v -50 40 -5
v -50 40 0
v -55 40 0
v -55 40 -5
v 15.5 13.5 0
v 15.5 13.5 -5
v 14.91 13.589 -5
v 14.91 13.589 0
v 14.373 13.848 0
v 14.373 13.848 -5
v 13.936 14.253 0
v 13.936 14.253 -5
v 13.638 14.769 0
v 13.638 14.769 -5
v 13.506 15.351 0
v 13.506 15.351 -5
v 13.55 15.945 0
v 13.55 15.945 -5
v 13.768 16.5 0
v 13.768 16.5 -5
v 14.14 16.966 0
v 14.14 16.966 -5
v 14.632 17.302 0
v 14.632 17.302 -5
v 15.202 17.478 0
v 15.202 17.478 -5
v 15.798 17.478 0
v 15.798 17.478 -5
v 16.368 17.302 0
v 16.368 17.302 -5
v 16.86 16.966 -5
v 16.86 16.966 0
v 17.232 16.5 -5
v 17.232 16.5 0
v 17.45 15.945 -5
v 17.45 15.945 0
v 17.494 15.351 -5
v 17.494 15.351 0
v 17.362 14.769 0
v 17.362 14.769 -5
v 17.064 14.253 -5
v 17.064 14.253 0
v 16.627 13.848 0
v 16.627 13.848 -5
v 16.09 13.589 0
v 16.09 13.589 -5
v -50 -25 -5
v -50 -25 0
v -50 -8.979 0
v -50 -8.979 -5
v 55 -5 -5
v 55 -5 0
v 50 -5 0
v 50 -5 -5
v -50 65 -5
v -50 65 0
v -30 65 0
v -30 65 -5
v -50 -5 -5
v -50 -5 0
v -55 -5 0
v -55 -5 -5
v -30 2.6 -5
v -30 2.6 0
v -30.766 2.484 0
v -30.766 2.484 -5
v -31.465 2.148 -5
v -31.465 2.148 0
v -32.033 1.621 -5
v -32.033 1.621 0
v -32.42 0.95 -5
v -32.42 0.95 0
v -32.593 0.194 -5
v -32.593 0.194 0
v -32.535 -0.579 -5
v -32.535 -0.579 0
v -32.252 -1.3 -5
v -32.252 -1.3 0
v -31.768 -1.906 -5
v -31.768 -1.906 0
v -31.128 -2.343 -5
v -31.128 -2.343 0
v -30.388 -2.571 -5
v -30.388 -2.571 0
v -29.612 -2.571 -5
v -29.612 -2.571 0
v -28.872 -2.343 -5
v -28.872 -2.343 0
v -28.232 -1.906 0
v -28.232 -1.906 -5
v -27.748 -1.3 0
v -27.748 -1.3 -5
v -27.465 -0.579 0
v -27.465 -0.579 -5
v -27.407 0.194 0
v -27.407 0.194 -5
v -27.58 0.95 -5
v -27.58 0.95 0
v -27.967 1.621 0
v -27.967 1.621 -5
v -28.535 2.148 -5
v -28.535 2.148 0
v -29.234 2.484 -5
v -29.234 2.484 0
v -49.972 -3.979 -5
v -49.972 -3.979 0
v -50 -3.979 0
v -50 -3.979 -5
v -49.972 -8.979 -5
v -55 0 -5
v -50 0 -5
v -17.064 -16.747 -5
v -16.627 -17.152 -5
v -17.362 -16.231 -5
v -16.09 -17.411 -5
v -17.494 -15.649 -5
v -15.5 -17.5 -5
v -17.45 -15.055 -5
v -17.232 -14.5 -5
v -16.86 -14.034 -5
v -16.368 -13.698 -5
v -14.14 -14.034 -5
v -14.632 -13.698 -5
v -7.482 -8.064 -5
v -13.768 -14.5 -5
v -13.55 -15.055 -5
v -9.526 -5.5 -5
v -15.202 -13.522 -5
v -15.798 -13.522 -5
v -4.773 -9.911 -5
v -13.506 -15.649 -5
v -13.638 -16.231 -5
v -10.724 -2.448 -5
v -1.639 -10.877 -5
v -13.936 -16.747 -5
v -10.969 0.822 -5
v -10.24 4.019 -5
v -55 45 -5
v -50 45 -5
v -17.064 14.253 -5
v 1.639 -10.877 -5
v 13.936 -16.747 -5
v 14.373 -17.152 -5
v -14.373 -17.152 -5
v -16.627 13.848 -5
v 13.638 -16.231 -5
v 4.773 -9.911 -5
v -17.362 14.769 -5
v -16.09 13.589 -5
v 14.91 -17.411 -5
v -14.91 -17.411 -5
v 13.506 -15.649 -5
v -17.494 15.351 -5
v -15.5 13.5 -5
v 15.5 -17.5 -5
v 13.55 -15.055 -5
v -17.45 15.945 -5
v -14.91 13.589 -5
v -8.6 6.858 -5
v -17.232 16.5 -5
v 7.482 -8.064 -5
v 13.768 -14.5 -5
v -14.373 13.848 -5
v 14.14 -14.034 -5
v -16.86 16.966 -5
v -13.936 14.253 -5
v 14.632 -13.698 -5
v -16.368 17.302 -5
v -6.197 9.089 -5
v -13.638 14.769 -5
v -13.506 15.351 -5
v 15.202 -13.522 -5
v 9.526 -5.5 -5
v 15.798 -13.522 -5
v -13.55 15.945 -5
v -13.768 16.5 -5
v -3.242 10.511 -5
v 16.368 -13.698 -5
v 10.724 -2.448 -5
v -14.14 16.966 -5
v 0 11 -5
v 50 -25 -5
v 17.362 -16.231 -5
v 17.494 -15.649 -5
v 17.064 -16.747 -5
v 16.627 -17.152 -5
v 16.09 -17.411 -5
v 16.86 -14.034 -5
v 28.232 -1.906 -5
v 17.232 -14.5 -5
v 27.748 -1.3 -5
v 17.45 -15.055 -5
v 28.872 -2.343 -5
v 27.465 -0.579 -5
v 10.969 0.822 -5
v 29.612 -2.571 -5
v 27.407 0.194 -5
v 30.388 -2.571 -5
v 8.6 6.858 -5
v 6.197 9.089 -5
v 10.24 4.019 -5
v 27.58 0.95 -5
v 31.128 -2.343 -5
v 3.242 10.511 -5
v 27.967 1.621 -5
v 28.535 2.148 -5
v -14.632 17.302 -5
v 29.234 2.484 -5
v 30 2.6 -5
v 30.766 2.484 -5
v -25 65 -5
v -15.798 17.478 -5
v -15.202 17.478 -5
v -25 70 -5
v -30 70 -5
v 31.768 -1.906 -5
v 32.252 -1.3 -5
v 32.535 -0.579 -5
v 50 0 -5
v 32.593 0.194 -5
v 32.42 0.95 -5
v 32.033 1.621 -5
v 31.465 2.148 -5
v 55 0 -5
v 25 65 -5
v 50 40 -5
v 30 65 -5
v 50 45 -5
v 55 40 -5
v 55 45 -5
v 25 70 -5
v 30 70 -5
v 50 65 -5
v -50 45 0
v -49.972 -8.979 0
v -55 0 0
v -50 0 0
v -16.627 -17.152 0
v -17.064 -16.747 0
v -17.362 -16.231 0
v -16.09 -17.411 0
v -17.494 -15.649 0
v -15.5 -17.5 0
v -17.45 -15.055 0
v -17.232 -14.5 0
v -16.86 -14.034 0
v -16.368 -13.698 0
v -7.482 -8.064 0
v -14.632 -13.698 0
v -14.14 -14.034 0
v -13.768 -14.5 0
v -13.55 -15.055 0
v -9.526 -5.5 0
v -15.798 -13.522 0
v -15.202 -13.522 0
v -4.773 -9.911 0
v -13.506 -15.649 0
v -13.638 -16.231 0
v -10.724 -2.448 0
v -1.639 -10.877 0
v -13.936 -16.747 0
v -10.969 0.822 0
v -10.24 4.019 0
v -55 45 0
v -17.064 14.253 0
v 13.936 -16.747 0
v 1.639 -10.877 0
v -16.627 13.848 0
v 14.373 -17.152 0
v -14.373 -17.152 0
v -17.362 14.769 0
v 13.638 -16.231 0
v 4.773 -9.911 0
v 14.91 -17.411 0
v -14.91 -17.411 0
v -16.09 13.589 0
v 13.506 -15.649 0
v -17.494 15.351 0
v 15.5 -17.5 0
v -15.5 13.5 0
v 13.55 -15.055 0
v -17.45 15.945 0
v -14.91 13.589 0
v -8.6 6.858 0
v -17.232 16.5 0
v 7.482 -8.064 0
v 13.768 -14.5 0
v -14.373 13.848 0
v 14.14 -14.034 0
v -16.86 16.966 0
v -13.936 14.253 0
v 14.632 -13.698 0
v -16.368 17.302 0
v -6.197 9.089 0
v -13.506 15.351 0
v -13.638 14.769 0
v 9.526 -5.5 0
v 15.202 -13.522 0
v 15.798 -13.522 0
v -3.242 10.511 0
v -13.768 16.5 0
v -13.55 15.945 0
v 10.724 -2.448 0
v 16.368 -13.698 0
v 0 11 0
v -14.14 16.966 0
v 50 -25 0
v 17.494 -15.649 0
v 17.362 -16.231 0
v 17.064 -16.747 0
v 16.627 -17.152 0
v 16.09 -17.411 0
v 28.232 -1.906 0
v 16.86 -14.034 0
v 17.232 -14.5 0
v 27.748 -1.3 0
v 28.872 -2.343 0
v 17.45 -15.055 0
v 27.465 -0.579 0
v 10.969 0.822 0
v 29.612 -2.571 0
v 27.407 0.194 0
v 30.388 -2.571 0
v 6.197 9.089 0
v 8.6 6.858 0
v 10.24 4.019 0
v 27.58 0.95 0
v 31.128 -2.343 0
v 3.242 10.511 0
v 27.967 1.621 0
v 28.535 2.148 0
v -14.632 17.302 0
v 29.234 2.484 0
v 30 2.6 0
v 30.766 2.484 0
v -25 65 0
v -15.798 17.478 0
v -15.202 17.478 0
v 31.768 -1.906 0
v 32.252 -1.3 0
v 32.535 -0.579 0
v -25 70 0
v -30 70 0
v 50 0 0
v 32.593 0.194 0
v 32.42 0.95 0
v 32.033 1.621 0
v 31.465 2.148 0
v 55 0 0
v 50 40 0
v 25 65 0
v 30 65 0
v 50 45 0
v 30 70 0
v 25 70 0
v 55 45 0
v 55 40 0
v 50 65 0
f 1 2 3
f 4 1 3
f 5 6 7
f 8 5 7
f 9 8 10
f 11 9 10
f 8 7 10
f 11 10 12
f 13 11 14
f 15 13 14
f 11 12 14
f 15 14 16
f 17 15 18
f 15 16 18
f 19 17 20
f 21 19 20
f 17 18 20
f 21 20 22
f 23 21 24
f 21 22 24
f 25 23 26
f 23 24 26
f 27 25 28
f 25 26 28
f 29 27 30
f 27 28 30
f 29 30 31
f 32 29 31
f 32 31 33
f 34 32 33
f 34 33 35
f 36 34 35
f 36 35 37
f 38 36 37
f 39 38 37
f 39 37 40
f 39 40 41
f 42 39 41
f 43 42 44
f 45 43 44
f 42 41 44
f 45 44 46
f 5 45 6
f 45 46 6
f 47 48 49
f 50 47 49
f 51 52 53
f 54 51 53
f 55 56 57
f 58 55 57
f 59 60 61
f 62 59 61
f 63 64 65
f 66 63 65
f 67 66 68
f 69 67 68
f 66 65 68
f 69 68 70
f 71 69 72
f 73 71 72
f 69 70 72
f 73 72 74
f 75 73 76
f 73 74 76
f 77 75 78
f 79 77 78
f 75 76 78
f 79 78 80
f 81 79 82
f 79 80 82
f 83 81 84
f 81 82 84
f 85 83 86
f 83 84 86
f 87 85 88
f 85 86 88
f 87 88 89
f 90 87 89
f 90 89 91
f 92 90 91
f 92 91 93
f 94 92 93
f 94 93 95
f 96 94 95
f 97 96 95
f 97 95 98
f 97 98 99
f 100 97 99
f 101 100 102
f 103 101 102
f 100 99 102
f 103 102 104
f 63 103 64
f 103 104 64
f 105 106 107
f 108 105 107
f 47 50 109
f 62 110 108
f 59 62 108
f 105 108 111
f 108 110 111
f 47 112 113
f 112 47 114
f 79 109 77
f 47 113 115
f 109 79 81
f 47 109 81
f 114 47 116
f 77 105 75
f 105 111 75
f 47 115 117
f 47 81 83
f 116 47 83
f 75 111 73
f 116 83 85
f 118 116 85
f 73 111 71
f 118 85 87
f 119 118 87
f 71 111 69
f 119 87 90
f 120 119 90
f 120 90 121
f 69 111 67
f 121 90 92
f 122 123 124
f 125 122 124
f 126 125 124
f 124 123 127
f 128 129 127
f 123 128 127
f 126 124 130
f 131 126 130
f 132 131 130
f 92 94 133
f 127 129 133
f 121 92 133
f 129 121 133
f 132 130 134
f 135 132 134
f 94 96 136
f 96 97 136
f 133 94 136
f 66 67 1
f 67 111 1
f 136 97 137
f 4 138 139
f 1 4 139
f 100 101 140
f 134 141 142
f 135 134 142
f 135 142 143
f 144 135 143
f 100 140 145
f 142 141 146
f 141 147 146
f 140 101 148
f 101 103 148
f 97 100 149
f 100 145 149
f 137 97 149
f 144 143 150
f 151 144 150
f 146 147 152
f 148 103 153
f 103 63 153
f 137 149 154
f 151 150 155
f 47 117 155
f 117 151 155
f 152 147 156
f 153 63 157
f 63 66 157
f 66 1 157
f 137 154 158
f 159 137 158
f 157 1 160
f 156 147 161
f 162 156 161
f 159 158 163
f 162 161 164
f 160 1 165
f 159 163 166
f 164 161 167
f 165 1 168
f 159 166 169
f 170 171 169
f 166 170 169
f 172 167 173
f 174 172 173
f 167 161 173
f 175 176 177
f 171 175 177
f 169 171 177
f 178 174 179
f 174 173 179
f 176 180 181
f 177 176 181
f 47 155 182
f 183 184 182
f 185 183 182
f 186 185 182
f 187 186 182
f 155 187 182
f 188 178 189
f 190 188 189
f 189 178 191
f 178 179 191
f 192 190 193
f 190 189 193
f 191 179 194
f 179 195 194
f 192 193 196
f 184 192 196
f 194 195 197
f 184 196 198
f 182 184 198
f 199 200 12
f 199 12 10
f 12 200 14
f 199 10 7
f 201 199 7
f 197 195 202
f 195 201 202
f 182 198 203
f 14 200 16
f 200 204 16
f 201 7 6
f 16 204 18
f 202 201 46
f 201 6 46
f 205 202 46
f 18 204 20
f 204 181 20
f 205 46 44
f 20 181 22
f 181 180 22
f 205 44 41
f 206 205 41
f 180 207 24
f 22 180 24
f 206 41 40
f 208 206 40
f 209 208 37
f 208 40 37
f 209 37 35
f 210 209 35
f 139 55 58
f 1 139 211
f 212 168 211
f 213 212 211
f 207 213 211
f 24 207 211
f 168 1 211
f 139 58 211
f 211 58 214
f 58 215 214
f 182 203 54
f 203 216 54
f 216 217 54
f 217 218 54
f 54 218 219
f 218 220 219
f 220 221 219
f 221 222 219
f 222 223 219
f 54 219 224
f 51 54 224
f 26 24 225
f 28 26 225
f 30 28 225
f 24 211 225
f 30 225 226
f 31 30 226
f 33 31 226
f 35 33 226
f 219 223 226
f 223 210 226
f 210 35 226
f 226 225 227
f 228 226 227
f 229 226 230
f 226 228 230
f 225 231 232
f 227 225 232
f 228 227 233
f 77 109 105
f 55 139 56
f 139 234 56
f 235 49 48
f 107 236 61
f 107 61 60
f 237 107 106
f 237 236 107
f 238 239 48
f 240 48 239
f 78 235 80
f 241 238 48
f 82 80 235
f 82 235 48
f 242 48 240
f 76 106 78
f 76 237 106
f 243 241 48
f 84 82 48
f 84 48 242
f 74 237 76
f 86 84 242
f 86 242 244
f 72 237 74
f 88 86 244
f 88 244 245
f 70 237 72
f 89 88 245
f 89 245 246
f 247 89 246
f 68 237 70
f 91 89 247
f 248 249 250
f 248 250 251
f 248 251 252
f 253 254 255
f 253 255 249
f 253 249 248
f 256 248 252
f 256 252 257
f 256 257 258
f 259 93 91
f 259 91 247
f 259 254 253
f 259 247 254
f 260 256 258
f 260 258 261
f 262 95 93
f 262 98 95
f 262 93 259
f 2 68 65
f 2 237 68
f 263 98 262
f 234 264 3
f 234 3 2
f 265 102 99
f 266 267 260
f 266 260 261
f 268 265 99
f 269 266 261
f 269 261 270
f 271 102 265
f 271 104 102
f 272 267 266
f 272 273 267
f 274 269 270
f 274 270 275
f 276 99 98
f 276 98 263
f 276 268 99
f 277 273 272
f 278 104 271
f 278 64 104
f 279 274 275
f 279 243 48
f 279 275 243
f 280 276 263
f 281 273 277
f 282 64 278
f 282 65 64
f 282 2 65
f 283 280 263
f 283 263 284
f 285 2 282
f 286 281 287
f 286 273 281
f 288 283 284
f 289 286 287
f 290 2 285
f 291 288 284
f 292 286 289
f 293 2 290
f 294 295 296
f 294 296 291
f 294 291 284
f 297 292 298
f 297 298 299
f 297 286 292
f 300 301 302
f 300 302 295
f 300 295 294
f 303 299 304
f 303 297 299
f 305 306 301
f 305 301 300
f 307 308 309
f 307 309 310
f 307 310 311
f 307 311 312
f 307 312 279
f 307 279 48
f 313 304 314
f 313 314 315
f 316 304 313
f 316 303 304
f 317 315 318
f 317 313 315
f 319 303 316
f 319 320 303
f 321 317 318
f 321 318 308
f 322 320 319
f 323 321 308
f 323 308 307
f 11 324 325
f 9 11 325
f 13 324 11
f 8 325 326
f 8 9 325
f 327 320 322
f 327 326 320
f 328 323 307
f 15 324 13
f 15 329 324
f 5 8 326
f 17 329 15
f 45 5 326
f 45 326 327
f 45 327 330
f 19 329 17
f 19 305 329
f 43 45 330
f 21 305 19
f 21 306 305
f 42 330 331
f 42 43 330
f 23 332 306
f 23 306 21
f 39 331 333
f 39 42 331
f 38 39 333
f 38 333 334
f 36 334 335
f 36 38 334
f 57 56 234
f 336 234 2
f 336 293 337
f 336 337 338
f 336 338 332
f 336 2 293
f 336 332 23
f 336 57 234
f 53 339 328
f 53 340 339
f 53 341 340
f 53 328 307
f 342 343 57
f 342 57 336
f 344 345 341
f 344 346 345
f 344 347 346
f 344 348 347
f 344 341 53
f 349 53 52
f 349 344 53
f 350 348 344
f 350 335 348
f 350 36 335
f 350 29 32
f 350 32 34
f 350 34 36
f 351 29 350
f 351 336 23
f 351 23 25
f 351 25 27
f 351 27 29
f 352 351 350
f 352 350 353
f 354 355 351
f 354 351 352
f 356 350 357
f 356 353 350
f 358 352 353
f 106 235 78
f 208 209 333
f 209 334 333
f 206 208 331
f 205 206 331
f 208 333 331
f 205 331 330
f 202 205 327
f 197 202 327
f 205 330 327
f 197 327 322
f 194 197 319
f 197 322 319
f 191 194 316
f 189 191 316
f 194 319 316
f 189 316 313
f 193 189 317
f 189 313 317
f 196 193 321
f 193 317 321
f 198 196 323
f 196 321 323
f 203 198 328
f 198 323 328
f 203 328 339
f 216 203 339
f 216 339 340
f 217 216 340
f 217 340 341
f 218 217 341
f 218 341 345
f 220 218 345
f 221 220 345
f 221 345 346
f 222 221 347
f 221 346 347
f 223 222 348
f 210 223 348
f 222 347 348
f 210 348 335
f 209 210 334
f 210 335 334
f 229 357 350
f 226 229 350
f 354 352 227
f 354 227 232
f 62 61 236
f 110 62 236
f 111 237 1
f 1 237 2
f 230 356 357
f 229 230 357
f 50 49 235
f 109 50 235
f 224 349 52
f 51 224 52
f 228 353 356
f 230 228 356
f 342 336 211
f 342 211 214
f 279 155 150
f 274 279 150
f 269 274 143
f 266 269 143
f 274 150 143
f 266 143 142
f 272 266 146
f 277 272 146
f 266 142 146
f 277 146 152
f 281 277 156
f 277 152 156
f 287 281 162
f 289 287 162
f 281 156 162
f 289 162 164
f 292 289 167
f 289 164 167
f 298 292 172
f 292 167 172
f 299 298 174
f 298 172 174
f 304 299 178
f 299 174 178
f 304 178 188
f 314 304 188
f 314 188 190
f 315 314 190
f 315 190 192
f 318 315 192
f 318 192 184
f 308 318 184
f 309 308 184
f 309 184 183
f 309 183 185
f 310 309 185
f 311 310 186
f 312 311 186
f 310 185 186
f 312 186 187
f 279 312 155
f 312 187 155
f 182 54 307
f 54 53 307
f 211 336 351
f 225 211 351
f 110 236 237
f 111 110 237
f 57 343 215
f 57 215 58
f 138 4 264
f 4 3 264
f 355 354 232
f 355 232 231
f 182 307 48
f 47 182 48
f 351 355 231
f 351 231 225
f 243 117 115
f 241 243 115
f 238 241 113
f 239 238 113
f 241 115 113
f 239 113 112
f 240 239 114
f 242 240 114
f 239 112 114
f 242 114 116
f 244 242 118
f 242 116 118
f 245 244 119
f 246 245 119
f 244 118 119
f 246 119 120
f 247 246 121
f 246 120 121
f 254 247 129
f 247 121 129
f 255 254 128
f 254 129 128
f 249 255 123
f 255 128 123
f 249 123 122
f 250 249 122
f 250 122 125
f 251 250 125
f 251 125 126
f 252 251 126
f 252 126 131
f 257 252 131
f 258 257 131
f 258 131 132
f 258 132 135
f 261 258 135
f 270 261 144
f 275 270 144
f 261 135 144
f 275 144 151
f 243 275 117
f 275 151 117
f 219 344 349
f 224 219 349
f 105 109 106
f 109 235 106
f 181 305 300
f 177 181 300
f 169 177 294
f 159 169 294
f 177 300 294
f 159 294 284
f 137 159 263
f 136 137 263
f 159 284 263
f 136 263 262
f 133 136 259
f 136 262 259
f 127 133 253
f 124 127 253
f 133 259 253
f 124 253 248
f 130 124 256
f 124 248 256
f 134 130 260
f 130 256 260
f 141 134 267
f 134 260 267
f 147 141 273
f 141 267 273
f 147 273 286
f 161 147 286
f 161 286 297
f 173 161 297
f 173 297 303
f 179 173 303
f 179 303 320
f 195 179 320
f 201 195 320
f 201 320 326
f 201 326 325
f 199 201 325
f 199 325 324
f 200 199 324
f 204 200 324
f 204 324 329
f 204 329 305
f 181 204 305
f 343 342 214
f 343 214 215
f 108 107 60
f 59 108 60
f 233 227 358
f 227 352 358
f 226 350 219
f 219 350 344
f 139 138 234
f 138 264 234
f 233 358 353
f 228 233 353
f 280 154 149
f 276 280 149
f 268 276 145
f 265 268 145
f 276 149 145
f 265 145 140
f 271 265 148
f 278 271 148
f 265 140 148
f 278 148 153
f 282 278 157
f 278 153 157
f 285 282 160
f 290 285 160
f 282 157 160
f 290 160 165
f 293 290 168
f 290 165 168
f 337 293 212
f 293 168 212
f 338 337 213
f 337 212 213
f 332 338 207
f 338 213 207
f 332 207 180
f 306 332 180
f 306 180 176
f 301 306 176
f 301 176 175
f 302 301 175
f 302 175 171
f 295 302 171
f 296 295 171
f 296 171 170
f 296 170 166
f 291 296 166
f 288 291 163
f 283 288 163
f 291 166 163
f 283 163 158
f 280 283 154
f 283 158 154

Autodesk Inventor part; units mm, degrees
ref_plane "YZ Plane" through (0, 0, 0) normal (1, 0, 0) x (0, 1, 0)
ref_plane "XZ Plane" through (0, 0, 0) normal (0, 1, 0) x (-1, 0, 0)
ref_plane "XY Plane" through (0, 0, 0) normal (0, 0, 1) x (1, 0, 0)
sketch "Block1" plane through (0, 0, 0) normal (0, 0, 1) x (1, 0, 0)
  line L0 (-30.1, 34.1) -> (-9.9, 34.1)
  line L1 (-9.9, 34.1) -> (-9.9, 25.1)
  line L2 (-9.9, 25.1) -> (9.9, 25.1)
  line L3 (9.9, 25.1) -> (9.9, 34.1)
  line L4 (9.9, 34.1) -> (30.1, 34.1)
  line L5 (30.1, 34.1) -> (30.1, 25.1)
  line L6 (30.1, 25.1) -> (50.1, 25.1)
  line L7 (50.1, 25.1) -> (50.1, 16.5667)
  line L8 (50.1, 16.5667) -> (41.1, 16.5667)
  line L9 (41.1, 16.5667) -> (41.1, 6.7667)
  line L10 (41.1, 6.7667) -> (50.1, 6.7667)
  line L11 (50.1, 6.7667) -> (50.1, -6.7667)
  line L12 (50.1, -6.7667) -> (41.1, -6.7667)
  line L13 (41.1, -6.7667) -> (41.1, -16.5667)
  line L14 (41.1, -16.5667) -> (50.1, -16.5667)
  line L15 (50.1, -16.5667) -> (50.1, -25.1)
  line L16 (50.1, -25.1) -> (30.1, -25.1)
  line L17 (30.1, -25.1) -> (30.1, -34.1)
  line L18 (30.1, -34.1) -> (9.9, -34.1)
  line L19 (9.9, -34.1) -> (9.9, -25.1)
  line L20 (9.9, -25.1) -> (-9.9, -25.1)
  line L21 (-9.9, -25.1) -> (-9.9, -34.1)
  line L22 (-9.9, -34.1) -> (-30.1, -34.1)
  line L23 (-30.1, -34.1) -> (-30.1, -25.1)
  line L24 (-30.1, -25.1) -> (-50.1, -25.1)
  line L25 (-50.1, -25.1) -> (-50.1, -16.5667)
  line L26 (-50.1, -16.5667) -> (-41.1, -16.5667)
  line L27 (-41.1, -16.5667) -> (-41.1, -6.7667)
  line L28 (-41.1, -6.7667) -> (-50.1, -6.7667)
  line L29 (-50.1, -6.7667) -> (-50.1, 6.7667)
  line L30 (-50.1, 6.7667) -> (-41.1, 6.7667)
  line L31 (-41.1, 6.7667) -> (-41.1, 16.5667)
  line L32 (-41.1, 16.5667) -> (-50.1, 16.5667)
  line L33 (-50.1, 16.5667) -> (-50.1, 25.1)
  line L34 (-50.1, 25.1) -> (-30.1, 25.1)
  line L35 (-30.1, 25.1) -> (-30.1, 34.1)
  circle A0 centre (-30, 0) radius 4.6
  circle A1 centre (-15.5, 15.5) radius 2.1
  circle A2 centre (-15.5, -15.5) radius 2.1
  circle A3 centre (0, 0) radius 11.1
  circle A4 centre (15.5, 15.5) radius 2.1
  circle A5 centre (30, 0) radius 4.6
  circle A6 centre (15.5, -15.5) radius 2.1
  point P0 (0, 0)
sketch "Block2" plane through (0, 0, 0) normal (0, 0, 1) x (1, 0, 0)
  line L0 (9.8, 34.2) -> (30.2, 34.2)
  line L1 (30.2, 34.2) -> (30.2, 25.2)
  line L2 (30.2, 25.2) -> (50.2, 25.2)
  line L3 (50.2, 25.2) -> (50.2, 16.4667)
  line L4 (50.2, 16.4667) -> (41.2, 16.4667)
  line L5 (41.2, 16.4667) -> (41.2, 6.8667)
  line L6 (41.2, 6.8667) -> (50.2, 6.8667)
  line L7 (50.2, 6.8667) -> (50.2, -6.8667)
  line L8 (50.2, -6.8667) -> (41.2, -6.8667)
  line L9 (41.2, -6.8667) -> (41.2, -16.4667)
  line L10 (41.2, -16.4667) -> (50.2, -16.4667)
  line L11 (50.2, -16.4667) -> (50.2, -25.2)
  line L12 (50.2, -25.2) -> (30.2, -25.2)
  line L13 (30.2, -25.2) -> (30.2, -34.2)
  line L14 (30.2, -34.2) -> (9.8, -34.2)
  line L15 (9.8, -34.2) -> (9.8, -25.2)
  line L16 (9.8, -25.2) -> (-9.8, -25.2)
  line L17 (-9.8, -25.2) -> (-9.8, -34.2)
  line L18 (-9.8, -34.2) -> (-30.2, -34.2)
  line L19 (-30.2, -34.2) -> (-30.2, -25.2)
  line L20 (-30.2, -25.2) -> (-50.2, -25.2)
  line L21 (-50.2, -25.2) -> (-50.2, -16.4667)
  line L22 (-50.2, -16.4667) -> (-41.2, -16.4667)
  line L23 (-41.2, -16.4667) -> (-41.2, -6.8667)
  line L24 (-41.2, -6.8667) -> (-50.2, -6.8667)
  line L25 (-50.2, -6.8667) -> (-50.2, 6.8667)
  line L26 (-50.2, 6.8667) -> (-41.2, 6.8667)
  line L27 (-41.2, 6.8667) -> (-41.2, 16.4667)
  line L28 (-41.2, 16.4667) -> (-50.2, 16.4667)
  line L29 (-50.2, 16.4667) -> (-50.2, 25.2)
  line L30 (-50.2, 25.2) -> (-30.2, 25.2)
  line L31 (-30.2, 25.2) -> (-30.2, 34.2)
  line L32 (-30.2, 34.2) -> (-9.8, 34.2)
  line L33 (-9.8, 34.2) -> (-9.8, 25.2)
  line L34 (-9.8, 25.2) -> (9.8, 25.2)
  line L35 (9.8, 25.2) -> (9.8, 34.2)
  circle A0 centre (-15.5, 15.5) radius 2.2
  circle A1 centre (15.5, 15.5) radius 2.2
  circle A2 centre (30, 0) radius 4.7
  circle A3 centre (15.5, -15.5) radius 2.2
  circle A4 centre (-15.5, -15.5) radius 2.2
  circle A5 centre (-30, 0) radius 4.7
  circle A6 centre (0, 0) radius 11.2
  point P0 (0, 0)
sketch "Block3" plane through (0, 0, 0) normal (0, 0, 1) x (1, 0, 0)
  line L0 (9.9, 34.1) -> (30.1, 34.1)
  line L1 (30.1, 34.1) -> (30.1, 25.1)
  line L2 (30.1, 25.1) -> (50.1, 25.1)
  line L3 (50.1, 25.1) -> (50.1, 16.5667)
  line L4 (50.1, 16.5667) -> (41.1, 16.5667)
  line L5 (41.1, 16.5667) -> (41.1, 6.7667)
  line L6 (41.1, 6.7667) -> (50.1, 6.7667)
  line L7 (50.1, 6.7667) -> (50.1, -6.7667)
  line L8 (50.1, -6.7667) -> (41.1, -6.7667)
  line L9 (41.1, -6.7667) -> (41.1, -16.5667)
  line L10 (41.1, -16.5667) -> (50.1, -16.5667)
  line L11 (50.1, -16.5667) -> (50.1, -25.1)
  line L12 (50.1, -25.1) -> (30.1, -25.1)
  line L13 (30.1, -25.1) -> (30.1, -34.1)
  line L14 (30.1, -34.1) -> (9.9, -34.1)
  line L15 (9.9, -34.1) -> (9.9, -25.1)
  line L16 (9.9, -25.1) -> (-9.9, -25.1)
  line L17 (-9.9, -25.1) -> (-9.9, -34.1)
  line L18 (-9.9, -34.1) -> (-30.1, -34.1)
  line L19 (-30.1, -34.1) -> (-30.1, -25.1)
  line L20 (-30.1, -25.1) -> (-50.1, -25.1)
  line L21 (-50.1, -25.1) -> (-50.1, -16.5667)
  line L22 (-50.1, -16.5667) -> (-41.1, -16.5667)
  line L23 (-41.1, -16.5667) -> (-41.1, -6.7667)
  line L24 (-41.1, -6.7667) -> (-50.1, -6.7667)
  line L25 (-50.1, -6.7667) -> (-50.1, 6.7667)
  line L26 (-50.1, 6.7667) -> (-41.1, 6.7667)
  line L27 (-41.1, 6.7667) -> (-41.1, 16.5667)
  line L28 (-41.1, 16.5667) -> (-50.1, 16.5667)
  line L29 (-50.1, 16.5667) -> (-50.1, 25.1)
  line L30 (-50.1, 25.1) -> (-30.1, 25.1)
  line L31 (-30.1, 25.1) -> (-30.1, 34.1)
  line L32 (-30.1, 34.1) -> (-9.9, 34.1)
  line L33 (-9.9, 34.1) -> (-9.9, 25.1)
  line L34 (-9.9, 25.1) -> (9.9, 25.1)
  line L35 (9.9, 25.1) -> (9.9, 34.1)
  circle A0 centre (-15.5, 15.5) radius 2.1
  circle A1 centre (15.5, 15.5) radius 2.1
  circle A2 centre (30, 0) radius 4.6
  circle A3 centre (15.5, -15.5) radius 2.1
  circle A4 centre (-15.5, -15.5) radius 2.1
  circle A5 centre (-30, 0) radius 4.6
  circle A6 centre (0, 0) radius 11.1
  point P0 (0, 0)
sketch "Block4" plane through (0, 0, 0) normal (0, 0, 1) x (1, 0, 0)
  line L0 (-30.08, 30.58) -> (-9.92, 30.58)
  line L1 (-9.92, 30.58) -> (-9.92, 25.08)
  line L2 (-9.92, 25.08) -> (9.92, 25.08)
  line L3 (9.92, 25.08) -> (9.92, 30.58)
  line L4 (9.92, 30.58) -> (30.08, 30.58)
  line L5 (30.08, 30.58) -> (30.08, 25.08)
  line L6 (30.08, 25.08) -> (50.08, 25.08)
  line L7 (50.08, 25.08) -> (50.08, 16.5867)
  line L8 (50.08, 16.5867) -> (44.58, 16.5867)
  line L9 (44.58, 16.5867) -> (44.58, 6.7467)
  line L10 (44.58, 6.7467) -> (50.08, 6.7467)
  line L11 (50.08, 6.7467) -> (50.08, -6.7467)
  line L12 (50.08, -6.7467) -> (44.58, -6.7467)
  line L13 (44.58, -6.7467) -> (44.58, -16.5867)
  line L14 (44.58, -16.5867) -> (50.08, -16.5867)
  line L15 (50.08, -16.5867) -> (50.08, -25.08)
  line L16 (50.08, -25.08) -> (30.08, -25.08)
  line L17 (30.08, -25.08) -> (30.08, -30.58)
  line L18 (30.08, -30.58) -> (9.92, -30.58)
  line L19 (9.92, -30.58) -> (9.92, -25.08)
  line L20 (9.92, -25.08) -> (-9.92, -25.08)
  line L21 (-9.92, -25.08) -> (-9.92, -30.58)
  line L22 (-9.92, -30.58) -> (-30.08, -30.58)
  line L23 (-30.08, -30.58) -> (-30.08, -25.08)
  line L24 (-30.08, -25.08) -> (-50.08, -25.08)
  line L25 (-50.08, -25.08) -> (-50.08, -16.5867)
  line L26 (-50.08, -16.5867) -> (-44.58, -16.5867)
  line L27 (-44.58, -16.5867) -> (-44.58, -6.7467)
  line L28 (-44.58, -6.7467) -> (-50.08, -6.7467)
  line L29 (-50.08, -6.7467) -> (-50.08, 6.7467)
  line L30 (-50.08, 6.7467) -> (-44.58, 6.7467)
  line L31 (-44.58, 6.7467) -> (-44.58, 16.5867)
  line L32 (-44.58, 16.5867) -> (-50.08, 16.5867)
  line L33 (-50.08, 16.5867) -> (-50.08, 25.08)
  line L34 (-50.08, 25.08) -> (-30.08, 25.08)
  line L35 (-30.08, 25.08) -> (-30.08, 30.58)
  circle A0 centre (-30, 0) radius 4.88
  circle A1 centre (30, 0) radius 4.88
  circle A2 centre (15.5, 15.5) radius 2.08
  circle A3 centre (0, 0) radius 11.08
  circle A4 centre (-15.5, 15.5) radius 2.08
  circle A5 centre (-15.5, -15.5) radius 2.08
  circle A6 centre (15.5, -15.5) radius 2.08
  point P0 (0, 0)
sketch "Sketch10" plane through (0, 0, 0) normal (0, 0, 1) x (1, 0, 0)
  line L0 (50, -25) -> (-50, -25)
  line L1 (-50, -25) -> (-50, 25)
  line L2 (-50, 25) -> (50, 25)
  line L3 (50, 25) -> (50, -25)
  line L4 (50, -25) -> (-50, 25) construction
  line L5 (-50, -25) -> (50, 25) construction
  point P0 (0, 0)
  dimension "d21" = 100
  dimension "d22" = 50
extrude "Extrusion2" add sketch "Sketch10" against normal blind 5
sketch "Sketch13" plane through (0, 0, 0) normal (0, 0, 1) x (1, 0, 0)
  line L0 (0, -47.8822) -> (0, 48.5933) projected
  line L1 (-201.8331, 0) -> (92.0889, 0) projected
  point P0 (-15.5, 15.5)
  point P1 (15.5, 15.5)
  point P2 (-15.5, -15.5)
  point P3 (15.5, -15.5)
  dimension "d43" = 31
  dimension "d44" = 31
hole "Hole4" at (-15.5, 15.5, 0) at (15.5, 15.5, 0) at (-15.5, -15.5, 0) at (15.5, -15.5, 0) direction (0, 0, -1) diameter 4 end through all
sketch "Sketch16" plane through (0, 0, -5) normal (0, 0, -1) x (-1, 0, 0)
  line L0 (0, -47.8822) -> (0, 48.5933) projected
  point P0 (0, 0)
  point P1 (-30, 0)
  point P2 (30, 0)
  dimension "d52" = 60
hole "Hole5" at (30, 0, -5) at (-30, 0, -5) direction (0, 0, 1) diameter 5.2 end through all
sketch "Sketch17" plane through (0, 0, -5) normal (0, 0, -1) x (-1, 0, 0)
  point P0 (0, 0)
  point P1 (0, 0)
hole "Hole8" at (0, 0, -5) direction (0, 0, 1) diameter 22 end through all
sketch "Sketch33" plane through (0, 0, 0) normal (0, 0, 1) x (1, 0, 0)
  line L0 (-50, 25) -> (50, 25) projected
  line L1 (-50, -25) -> (-50, 25) projected
  line L2 (0, -47.8822) -> (0, 48.5933) projected
  line L3 (-201.8331, 0) -> (92.0889, 0) projected
  line L4 (-30, 25) -> (-10, 25)
  line L5 (-10, 25) -> (-10, 30.5)
  line L6 (-10, 30.5) -> (-30, 30.5)
  line L7 (-30, 30.5) -> (-30, 25)
  line L8 (30, 25) -> (10, 25)
  line L9 (10, 25) -> (10, 30.5)
  line L10 (10, 30.5) -> (30, 30.5)
  line L11 (30, 30.5) -> (30, 25)
  line L12 (-30, -25) -> (-10, -25)
  line L13 (-10, -25) -> (-10, -30.5)
  line L14 (-10, -30.5) -> (-30, -30.5)
  line L15 (-30, -30.5) -> (-30, -25)
  line L16 (10, -25) -> (10, -30.5)
  line L17 (30, -25) -> (10, -25)
  line L18 (10, -30.5) -> (30, -30.5)
  line L19 (30, -30.5) -> (30, -25)
  point P0 (-50, 16.6667)
  dimension "d121" = 20
  dimension "d122" = 5.5
  dimension "d123" = 20
extrude "Extrusion5" [suppressed]
sketch "Sketch34" plane through (0, 0, -5) normal (0, 0, -1) x (-1, 0, 0)
  line L0 (50, 25) -> (-50, 25) projected
  line L1 (-50, 25) -> (-50, -25) projected
  line L2 (-50, 16.6667) -> (-44.5, 16.6667)
  line L3 (-44.5, 16.6667) -> (-44.5, 6.6667)
  line L4 (-44.5, 6.6667) -> (-50, 6.6667)
  line L5 (-50, 6.6667) -> (-50, 16.6667)
  line L6 (201.8331, 0) -> (-92.0889, 0) projected
  line L7 (0, -47.8822) -> (0, 48.5933) projected
  line L8 (-50, -16.6667) -> (-44.5, -16.6667)
  line L9 (-44.5, -16.6667) -> (-44.5, -6.6667)
  line L10 (-44.5, -6.6667) -> (-50, -6.6667)
  line L11 (-50, -6.6667) -> (-50, -16.6667)
  line L12 (50, 16.6667) -> (44.5, 16.6667)
  line L13 (44.5, 16.6667) -> (44.5, 6.6667)
  line L14 (44.5, 6.6667) -> (50, 6.6667)
  line L15 (50, 6.6667) -> (50, 16.6667)
  line L16 (44.5, -16.6667) -> (44.5, -6.6667)
  line L17 (50, -16.6667) -> (44.5, -16.6667)
  line L18 (44.5, -6.6667) -> (50, -6.6667)
  line L19 (50, -6.6667) -> (50, -16.6667)
  point P0 (-30, 25)
  dimension "d131" = 5.5
  dimension "d132" = 10
  dimension "d133" = 8.3333
extrude "Extrusion6" [suppressed]
sketch "Sketch45" plane through (0, 0, 0) normal (0, 0, 1) x (1, 0, 0)
  circle A0 centre (0, 0) radius 11 projected
  circle A1 centre (30, 0) radius 2.6 projected
  circle A2 centre (-30, 0) radius 2.6 projected
  circle A3 centre (-15.5, -15.5) radius 2 projected
  circle A4 centre (-15.5, 15.5) radius 2 projected
  circle A5 centre (15.5, 15.5) radius 2 projected
  circle A6 centre (15.5, -15.5) radius 2 projected
  line L0 (50, -25) -> (-50, -25) projected
  line L1 (50, 25) -> (50, -25) projected
  line L2 (-50, 25) -> (50, 25) projected
  line L3 (-50, -25) -> (-50, 25) projected
  line L4 (50, 25) -> (-50, 25)
  line L5 (-50, 25) -> (-50, 65)
  line L6 (-50, 65) -> (50, 65)
  line L7 (50, 65) -> (50, 25)
  dimension "d189" = 40
extrude "Extrusion10" add sketch "Sketch45" against normal blind 5 contours L2 L5 L6 L7
sketch "Sketch46" plane through (0, 0, 0) normal (0, 0, 1) x (1, 0, 0)
  line L0 (-49.9718, -3.9786) -> (-54.9718, -3.9786)
  line L1 (-54.9718, -3.9786) -> (-54.9718, -8.9786)
  line L2 (-54.9718, -8.9786) -> (-49.9718, -8.9786)
  line L3 (-49.9718, -8.9786) -> (-49.9718, -3.9786)
  point P0 (0, 0)
  dimension "d192" = 5
  dimension "d193" = 5
extrude "Extrusion11" cut sketch "Sketch46" against normal blind 5
sketch "Sketch47" plane through (0, 0, 0) normal (0, 0, 1) x (1, 0, 0)
  line L0 (-50, -5) -> (-55, -5)
  line L1 (-55, -5) -> (-55, 0)
  line L2 (-55, 0) -> (-50, 0)
  line L3 (-50, 0) -> (-50, -5)
  line L4 (-50, -3.9786) -> (-50, 65) projected
  line L5 (50, -25) -> (-50, -25) projected
  point P0 (0, 0)
  dimension "d196" = 5
  dimension "d197" = 5
  dimension "d200" = 20
extrude "Extrusion12" add sketch "Sketch47" against normal blind 5
sketch "Sketch48" plane through (0, 0, 0) normal (0, 0, 1) x (1, 0, 0)
  line L0 (50, 0) -> (55, 0)
  line L1 (55, 0) -> (55, -5)
  line L2 (55, -5) -> (50, -5)
  line L3 (50, -5) -> (50, 0)
  line L4 (50, -25) -> (-50, -25) projected
  line L5 (50, -25) -> (50, 65) projected
  point P0 (0, 0)
  dimension "d201" = 5
  dimension "d202" = 5
  dimension "d203" = 20
extrude "Extrusion13" add sketch "Sketch48" against normal blind 5
sketch "Sketch50" plane through (0, 0, 0) normal (0, 0, 1) x (1, 0, 0)
  line L0 (-30, 65) -> (-25, 65)
  line L1 (-25, 65) -> (-25, 70)
  line L2 (-25, 70) -> (-30, 70)
  line L3 (-30, 70) -> (-30, 65)
  line L4 (-30, 65) -> (-25, 70) construction
  line L5 (-25, 65) -> (-30, 70) construction
  line L6 (-50, 0) -> (-50, 65) projected
  line L7 (50, 65) -> (-50, 65) projected
  line L8 (25, 65) -> (30, 65)
  line L9 (30, 65) -> (30, 70)
  line L10 (30, 70) -> (25, 70)
  line L11 (25, 70) -> (25, 65)
  line L12 (25, 65) -> (30, 70) construction
  line L13 (30, 65) -> (25, 70) construction
  line L14 (50, 0) -> (50, 65) projected
  point P0 (0, 0)
  point P1 (-27.5, 67.5)
  point P2 (27.5, 67.5)
  dimension "d210" = 5
  dimension "d211" = 5
  dimension "d212" = 20
  dimension "d213" = 5
  dimension "d214" = 5
  dimension "d215" = 20
extrude "Extrusion15" add sketch "Sketch50" against normal blind 5
sketch "Sketch51" plane through (0, 0, 0) normal (0, 0, 1) x (1, 0, 0)
  line L0 (-50, 40) -> (-55, 40)
  line L1 (-55, 40) -> (-55, 45)
  line L2 (-55, 45) -> (-50, 45)
  line L3 (-50, 45) -> (-50, 40)
  line L4 (-50, 40) -> (-55, 45) construction
  line L5 (-55, 40) -> (-50, 45) construction
  line L6 (-55, 0) -> (-50, 0) projected
  line L7 (-50, 0) -> (-50, 65) projected
  line L8 (50, 45) -> (55, 45)
  line L9 (55, 45) -> (55, 40)
  line L10 (55, 40) -> (50, 40)
  line L11 (50, 40) -> (50, 45)
  line L12 (50, 45) -> (55, 40) construction
  line L13 (55, 45) -> (50, 40) construction
  line L14 (50, 0) -> (55, 0) projected
  line L15 (50, 0) -> (50, 65) projected
  point P0 (0, 0)
  point P1 (-52.5, 42.5)
  point P2 (52.5, 42.5)
  dimension "d218" = 5
  dimension "d219" = 5
  dimension "d220" = 40
  dimension "d221" = 5
  dimension "d222" = 5
  dimension "d223" = 40
extrude "Extrusion16" add sketch "Sketch51" against normal blind 5
equation "\"d121\" = 0.2 * d21"
equation "\"d122\" = Wt"
equation "\"d123\" = 0.2 * d21"
equation "\"d129\" = Wt"
equation "\"d131\" = Wt"
equation "\"d132\" = 0.2 * d22"
equation "\"d133\" = 0.166667 * d22"
equation "\"d134\" = Wt"
equation "\"Wt\" = 5.5"
properties part number "holder_plate" material "Wood (Birch)"
